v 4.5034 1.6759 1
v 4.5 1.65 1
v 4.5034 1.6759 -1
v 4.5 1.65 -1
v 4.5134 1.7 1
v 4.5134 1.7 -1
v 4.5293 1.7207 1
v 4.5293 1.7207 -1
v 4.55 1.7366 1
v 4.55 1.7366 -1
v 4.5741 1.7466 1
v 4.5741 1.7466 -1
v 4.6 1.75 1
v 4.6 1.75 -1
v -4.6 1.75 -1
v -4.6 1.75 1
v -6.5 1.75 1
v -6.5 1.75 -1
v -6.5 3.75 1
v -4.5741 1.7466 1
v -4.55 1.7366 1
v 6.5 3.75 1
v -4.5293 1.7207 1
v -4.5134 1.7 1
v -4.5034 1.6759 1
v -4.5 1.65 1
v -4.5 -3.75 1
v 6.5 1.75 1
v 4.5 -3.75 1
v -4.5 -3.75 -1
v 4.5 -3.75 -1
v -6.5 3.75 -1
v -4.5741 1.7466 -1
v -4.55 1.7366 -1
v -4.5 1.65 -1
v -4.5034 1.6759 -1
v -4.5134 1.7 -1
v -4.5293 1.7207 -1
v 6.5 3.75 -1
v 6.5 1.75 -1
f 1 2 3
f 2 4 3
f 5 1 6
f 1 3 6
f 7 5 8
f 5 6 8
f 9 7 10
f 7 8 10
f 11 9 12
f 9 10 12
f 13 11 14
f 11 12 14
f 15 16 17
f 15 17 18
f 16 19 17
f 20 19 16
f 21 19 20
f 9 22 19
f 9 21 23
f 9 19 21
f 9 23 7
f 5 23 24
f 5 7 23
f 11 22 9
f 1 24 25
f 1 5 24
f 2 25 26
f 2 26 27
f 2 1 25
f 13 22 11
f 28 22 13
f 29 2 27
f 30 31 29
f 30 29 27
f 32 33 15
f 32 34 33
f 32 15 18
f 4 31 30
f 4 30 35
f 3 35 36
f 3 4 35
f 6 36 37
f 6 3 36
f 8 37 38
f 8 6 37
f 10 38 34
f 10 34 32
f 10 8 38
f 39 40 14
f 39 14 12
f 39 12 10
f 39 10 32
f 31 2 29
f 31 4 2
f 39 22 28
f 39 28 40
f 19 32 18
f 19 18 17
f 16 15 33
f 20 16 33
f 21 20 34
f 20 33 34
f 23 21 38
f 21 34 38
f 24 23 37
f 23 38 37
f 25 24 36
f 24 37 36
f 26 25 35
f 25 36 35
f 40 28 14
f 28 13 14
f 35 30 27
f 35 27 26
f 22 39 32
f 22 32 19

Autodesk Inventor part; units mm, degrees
ref_plane "YZ Plane" through (0, 0, 0) normal (1, 0, 0) x (0, 1, 0)
ref_plane "XZ Plane" through (0, 0, 0) normal (0, 1, 0) x (-1, 0, 0)
ref_plane "XY Plane" through (0, 0, 0) normal (0, 0, 1) x (1, 0, 0)
sketch "Sketch1" plane through (0, 0, 0) normal (0, 0, 1) x (1, 0, 0)
  line L0 (4.5, -3.75) -> (-4.5, -3.75)
  line L1 (-4.5, -3.75) -> (-4.5, 3.75)
  line L2 (-4.5, 3.75) -> (4.5, 3.75)
  line L3 (4.5, 3.75) -> (4.5, -3.75)
  line L4 (4.5, -3.75) -> (-4.5, 3.75) construction
  line L5 (-4.5, -3.75) -> (4.5, 3.75) construction
  point P0 (0, 0)
  dimension "d0" = 9
  dimension "d1" = 7.5
extrude "Extrusion1" add sketch "Sketch1" along normal mid plane 2
sketch "Sketch2" plane through (4.5, -3.75, 1) normal (1, 0, 0) x (0, 0, -1)
  line L0 (2, 7.5) -> (0, 7.5) projected
  line L1 (2, 7.5) -> (0, 7.5)
  line L2 (0, 7.5) -> (0, 5.5)
  line L3 (0, 5.5) -> (2, 5.5)
  line L4 (2, 5.5) -> (2, 7.5)
  point P0 (1, 3.75)
  dimension "d4" = 2
  dimension "d5" = 2
extrude "Extrusion2" add sketch "Sketch2" along normal blind 2
sketch "Sketch3" plane through (-4.5, -3.75, 1) normal (-1, 0, 0) x (0, 0, 1)
  line L0 (-2, 7.5) -> (0, 7.5) projected
  line L1 (0, 7.5) -> (0, 0) projected
  line L2 (-2, 7.5) -> (0, 7.5)
  line L3 (0, 7.5) -> (0, 5.5)
  line L4 (0, 5.5) -> (-2, 5.5)
  line L5 (-2, 5.5) -> (-2, 7.5)
  point P0 (-1, 3.75)
  dimension "d8" = 2
extrude "Extrusion3" add sketch "Sketch3" along normal blind 2
fillet "Fillet1" radius 0.1 2 edges at (4.5, 1.75, 0) (-4.5, 1.75, 0)
properties part number "Tapa_1_TFM"
